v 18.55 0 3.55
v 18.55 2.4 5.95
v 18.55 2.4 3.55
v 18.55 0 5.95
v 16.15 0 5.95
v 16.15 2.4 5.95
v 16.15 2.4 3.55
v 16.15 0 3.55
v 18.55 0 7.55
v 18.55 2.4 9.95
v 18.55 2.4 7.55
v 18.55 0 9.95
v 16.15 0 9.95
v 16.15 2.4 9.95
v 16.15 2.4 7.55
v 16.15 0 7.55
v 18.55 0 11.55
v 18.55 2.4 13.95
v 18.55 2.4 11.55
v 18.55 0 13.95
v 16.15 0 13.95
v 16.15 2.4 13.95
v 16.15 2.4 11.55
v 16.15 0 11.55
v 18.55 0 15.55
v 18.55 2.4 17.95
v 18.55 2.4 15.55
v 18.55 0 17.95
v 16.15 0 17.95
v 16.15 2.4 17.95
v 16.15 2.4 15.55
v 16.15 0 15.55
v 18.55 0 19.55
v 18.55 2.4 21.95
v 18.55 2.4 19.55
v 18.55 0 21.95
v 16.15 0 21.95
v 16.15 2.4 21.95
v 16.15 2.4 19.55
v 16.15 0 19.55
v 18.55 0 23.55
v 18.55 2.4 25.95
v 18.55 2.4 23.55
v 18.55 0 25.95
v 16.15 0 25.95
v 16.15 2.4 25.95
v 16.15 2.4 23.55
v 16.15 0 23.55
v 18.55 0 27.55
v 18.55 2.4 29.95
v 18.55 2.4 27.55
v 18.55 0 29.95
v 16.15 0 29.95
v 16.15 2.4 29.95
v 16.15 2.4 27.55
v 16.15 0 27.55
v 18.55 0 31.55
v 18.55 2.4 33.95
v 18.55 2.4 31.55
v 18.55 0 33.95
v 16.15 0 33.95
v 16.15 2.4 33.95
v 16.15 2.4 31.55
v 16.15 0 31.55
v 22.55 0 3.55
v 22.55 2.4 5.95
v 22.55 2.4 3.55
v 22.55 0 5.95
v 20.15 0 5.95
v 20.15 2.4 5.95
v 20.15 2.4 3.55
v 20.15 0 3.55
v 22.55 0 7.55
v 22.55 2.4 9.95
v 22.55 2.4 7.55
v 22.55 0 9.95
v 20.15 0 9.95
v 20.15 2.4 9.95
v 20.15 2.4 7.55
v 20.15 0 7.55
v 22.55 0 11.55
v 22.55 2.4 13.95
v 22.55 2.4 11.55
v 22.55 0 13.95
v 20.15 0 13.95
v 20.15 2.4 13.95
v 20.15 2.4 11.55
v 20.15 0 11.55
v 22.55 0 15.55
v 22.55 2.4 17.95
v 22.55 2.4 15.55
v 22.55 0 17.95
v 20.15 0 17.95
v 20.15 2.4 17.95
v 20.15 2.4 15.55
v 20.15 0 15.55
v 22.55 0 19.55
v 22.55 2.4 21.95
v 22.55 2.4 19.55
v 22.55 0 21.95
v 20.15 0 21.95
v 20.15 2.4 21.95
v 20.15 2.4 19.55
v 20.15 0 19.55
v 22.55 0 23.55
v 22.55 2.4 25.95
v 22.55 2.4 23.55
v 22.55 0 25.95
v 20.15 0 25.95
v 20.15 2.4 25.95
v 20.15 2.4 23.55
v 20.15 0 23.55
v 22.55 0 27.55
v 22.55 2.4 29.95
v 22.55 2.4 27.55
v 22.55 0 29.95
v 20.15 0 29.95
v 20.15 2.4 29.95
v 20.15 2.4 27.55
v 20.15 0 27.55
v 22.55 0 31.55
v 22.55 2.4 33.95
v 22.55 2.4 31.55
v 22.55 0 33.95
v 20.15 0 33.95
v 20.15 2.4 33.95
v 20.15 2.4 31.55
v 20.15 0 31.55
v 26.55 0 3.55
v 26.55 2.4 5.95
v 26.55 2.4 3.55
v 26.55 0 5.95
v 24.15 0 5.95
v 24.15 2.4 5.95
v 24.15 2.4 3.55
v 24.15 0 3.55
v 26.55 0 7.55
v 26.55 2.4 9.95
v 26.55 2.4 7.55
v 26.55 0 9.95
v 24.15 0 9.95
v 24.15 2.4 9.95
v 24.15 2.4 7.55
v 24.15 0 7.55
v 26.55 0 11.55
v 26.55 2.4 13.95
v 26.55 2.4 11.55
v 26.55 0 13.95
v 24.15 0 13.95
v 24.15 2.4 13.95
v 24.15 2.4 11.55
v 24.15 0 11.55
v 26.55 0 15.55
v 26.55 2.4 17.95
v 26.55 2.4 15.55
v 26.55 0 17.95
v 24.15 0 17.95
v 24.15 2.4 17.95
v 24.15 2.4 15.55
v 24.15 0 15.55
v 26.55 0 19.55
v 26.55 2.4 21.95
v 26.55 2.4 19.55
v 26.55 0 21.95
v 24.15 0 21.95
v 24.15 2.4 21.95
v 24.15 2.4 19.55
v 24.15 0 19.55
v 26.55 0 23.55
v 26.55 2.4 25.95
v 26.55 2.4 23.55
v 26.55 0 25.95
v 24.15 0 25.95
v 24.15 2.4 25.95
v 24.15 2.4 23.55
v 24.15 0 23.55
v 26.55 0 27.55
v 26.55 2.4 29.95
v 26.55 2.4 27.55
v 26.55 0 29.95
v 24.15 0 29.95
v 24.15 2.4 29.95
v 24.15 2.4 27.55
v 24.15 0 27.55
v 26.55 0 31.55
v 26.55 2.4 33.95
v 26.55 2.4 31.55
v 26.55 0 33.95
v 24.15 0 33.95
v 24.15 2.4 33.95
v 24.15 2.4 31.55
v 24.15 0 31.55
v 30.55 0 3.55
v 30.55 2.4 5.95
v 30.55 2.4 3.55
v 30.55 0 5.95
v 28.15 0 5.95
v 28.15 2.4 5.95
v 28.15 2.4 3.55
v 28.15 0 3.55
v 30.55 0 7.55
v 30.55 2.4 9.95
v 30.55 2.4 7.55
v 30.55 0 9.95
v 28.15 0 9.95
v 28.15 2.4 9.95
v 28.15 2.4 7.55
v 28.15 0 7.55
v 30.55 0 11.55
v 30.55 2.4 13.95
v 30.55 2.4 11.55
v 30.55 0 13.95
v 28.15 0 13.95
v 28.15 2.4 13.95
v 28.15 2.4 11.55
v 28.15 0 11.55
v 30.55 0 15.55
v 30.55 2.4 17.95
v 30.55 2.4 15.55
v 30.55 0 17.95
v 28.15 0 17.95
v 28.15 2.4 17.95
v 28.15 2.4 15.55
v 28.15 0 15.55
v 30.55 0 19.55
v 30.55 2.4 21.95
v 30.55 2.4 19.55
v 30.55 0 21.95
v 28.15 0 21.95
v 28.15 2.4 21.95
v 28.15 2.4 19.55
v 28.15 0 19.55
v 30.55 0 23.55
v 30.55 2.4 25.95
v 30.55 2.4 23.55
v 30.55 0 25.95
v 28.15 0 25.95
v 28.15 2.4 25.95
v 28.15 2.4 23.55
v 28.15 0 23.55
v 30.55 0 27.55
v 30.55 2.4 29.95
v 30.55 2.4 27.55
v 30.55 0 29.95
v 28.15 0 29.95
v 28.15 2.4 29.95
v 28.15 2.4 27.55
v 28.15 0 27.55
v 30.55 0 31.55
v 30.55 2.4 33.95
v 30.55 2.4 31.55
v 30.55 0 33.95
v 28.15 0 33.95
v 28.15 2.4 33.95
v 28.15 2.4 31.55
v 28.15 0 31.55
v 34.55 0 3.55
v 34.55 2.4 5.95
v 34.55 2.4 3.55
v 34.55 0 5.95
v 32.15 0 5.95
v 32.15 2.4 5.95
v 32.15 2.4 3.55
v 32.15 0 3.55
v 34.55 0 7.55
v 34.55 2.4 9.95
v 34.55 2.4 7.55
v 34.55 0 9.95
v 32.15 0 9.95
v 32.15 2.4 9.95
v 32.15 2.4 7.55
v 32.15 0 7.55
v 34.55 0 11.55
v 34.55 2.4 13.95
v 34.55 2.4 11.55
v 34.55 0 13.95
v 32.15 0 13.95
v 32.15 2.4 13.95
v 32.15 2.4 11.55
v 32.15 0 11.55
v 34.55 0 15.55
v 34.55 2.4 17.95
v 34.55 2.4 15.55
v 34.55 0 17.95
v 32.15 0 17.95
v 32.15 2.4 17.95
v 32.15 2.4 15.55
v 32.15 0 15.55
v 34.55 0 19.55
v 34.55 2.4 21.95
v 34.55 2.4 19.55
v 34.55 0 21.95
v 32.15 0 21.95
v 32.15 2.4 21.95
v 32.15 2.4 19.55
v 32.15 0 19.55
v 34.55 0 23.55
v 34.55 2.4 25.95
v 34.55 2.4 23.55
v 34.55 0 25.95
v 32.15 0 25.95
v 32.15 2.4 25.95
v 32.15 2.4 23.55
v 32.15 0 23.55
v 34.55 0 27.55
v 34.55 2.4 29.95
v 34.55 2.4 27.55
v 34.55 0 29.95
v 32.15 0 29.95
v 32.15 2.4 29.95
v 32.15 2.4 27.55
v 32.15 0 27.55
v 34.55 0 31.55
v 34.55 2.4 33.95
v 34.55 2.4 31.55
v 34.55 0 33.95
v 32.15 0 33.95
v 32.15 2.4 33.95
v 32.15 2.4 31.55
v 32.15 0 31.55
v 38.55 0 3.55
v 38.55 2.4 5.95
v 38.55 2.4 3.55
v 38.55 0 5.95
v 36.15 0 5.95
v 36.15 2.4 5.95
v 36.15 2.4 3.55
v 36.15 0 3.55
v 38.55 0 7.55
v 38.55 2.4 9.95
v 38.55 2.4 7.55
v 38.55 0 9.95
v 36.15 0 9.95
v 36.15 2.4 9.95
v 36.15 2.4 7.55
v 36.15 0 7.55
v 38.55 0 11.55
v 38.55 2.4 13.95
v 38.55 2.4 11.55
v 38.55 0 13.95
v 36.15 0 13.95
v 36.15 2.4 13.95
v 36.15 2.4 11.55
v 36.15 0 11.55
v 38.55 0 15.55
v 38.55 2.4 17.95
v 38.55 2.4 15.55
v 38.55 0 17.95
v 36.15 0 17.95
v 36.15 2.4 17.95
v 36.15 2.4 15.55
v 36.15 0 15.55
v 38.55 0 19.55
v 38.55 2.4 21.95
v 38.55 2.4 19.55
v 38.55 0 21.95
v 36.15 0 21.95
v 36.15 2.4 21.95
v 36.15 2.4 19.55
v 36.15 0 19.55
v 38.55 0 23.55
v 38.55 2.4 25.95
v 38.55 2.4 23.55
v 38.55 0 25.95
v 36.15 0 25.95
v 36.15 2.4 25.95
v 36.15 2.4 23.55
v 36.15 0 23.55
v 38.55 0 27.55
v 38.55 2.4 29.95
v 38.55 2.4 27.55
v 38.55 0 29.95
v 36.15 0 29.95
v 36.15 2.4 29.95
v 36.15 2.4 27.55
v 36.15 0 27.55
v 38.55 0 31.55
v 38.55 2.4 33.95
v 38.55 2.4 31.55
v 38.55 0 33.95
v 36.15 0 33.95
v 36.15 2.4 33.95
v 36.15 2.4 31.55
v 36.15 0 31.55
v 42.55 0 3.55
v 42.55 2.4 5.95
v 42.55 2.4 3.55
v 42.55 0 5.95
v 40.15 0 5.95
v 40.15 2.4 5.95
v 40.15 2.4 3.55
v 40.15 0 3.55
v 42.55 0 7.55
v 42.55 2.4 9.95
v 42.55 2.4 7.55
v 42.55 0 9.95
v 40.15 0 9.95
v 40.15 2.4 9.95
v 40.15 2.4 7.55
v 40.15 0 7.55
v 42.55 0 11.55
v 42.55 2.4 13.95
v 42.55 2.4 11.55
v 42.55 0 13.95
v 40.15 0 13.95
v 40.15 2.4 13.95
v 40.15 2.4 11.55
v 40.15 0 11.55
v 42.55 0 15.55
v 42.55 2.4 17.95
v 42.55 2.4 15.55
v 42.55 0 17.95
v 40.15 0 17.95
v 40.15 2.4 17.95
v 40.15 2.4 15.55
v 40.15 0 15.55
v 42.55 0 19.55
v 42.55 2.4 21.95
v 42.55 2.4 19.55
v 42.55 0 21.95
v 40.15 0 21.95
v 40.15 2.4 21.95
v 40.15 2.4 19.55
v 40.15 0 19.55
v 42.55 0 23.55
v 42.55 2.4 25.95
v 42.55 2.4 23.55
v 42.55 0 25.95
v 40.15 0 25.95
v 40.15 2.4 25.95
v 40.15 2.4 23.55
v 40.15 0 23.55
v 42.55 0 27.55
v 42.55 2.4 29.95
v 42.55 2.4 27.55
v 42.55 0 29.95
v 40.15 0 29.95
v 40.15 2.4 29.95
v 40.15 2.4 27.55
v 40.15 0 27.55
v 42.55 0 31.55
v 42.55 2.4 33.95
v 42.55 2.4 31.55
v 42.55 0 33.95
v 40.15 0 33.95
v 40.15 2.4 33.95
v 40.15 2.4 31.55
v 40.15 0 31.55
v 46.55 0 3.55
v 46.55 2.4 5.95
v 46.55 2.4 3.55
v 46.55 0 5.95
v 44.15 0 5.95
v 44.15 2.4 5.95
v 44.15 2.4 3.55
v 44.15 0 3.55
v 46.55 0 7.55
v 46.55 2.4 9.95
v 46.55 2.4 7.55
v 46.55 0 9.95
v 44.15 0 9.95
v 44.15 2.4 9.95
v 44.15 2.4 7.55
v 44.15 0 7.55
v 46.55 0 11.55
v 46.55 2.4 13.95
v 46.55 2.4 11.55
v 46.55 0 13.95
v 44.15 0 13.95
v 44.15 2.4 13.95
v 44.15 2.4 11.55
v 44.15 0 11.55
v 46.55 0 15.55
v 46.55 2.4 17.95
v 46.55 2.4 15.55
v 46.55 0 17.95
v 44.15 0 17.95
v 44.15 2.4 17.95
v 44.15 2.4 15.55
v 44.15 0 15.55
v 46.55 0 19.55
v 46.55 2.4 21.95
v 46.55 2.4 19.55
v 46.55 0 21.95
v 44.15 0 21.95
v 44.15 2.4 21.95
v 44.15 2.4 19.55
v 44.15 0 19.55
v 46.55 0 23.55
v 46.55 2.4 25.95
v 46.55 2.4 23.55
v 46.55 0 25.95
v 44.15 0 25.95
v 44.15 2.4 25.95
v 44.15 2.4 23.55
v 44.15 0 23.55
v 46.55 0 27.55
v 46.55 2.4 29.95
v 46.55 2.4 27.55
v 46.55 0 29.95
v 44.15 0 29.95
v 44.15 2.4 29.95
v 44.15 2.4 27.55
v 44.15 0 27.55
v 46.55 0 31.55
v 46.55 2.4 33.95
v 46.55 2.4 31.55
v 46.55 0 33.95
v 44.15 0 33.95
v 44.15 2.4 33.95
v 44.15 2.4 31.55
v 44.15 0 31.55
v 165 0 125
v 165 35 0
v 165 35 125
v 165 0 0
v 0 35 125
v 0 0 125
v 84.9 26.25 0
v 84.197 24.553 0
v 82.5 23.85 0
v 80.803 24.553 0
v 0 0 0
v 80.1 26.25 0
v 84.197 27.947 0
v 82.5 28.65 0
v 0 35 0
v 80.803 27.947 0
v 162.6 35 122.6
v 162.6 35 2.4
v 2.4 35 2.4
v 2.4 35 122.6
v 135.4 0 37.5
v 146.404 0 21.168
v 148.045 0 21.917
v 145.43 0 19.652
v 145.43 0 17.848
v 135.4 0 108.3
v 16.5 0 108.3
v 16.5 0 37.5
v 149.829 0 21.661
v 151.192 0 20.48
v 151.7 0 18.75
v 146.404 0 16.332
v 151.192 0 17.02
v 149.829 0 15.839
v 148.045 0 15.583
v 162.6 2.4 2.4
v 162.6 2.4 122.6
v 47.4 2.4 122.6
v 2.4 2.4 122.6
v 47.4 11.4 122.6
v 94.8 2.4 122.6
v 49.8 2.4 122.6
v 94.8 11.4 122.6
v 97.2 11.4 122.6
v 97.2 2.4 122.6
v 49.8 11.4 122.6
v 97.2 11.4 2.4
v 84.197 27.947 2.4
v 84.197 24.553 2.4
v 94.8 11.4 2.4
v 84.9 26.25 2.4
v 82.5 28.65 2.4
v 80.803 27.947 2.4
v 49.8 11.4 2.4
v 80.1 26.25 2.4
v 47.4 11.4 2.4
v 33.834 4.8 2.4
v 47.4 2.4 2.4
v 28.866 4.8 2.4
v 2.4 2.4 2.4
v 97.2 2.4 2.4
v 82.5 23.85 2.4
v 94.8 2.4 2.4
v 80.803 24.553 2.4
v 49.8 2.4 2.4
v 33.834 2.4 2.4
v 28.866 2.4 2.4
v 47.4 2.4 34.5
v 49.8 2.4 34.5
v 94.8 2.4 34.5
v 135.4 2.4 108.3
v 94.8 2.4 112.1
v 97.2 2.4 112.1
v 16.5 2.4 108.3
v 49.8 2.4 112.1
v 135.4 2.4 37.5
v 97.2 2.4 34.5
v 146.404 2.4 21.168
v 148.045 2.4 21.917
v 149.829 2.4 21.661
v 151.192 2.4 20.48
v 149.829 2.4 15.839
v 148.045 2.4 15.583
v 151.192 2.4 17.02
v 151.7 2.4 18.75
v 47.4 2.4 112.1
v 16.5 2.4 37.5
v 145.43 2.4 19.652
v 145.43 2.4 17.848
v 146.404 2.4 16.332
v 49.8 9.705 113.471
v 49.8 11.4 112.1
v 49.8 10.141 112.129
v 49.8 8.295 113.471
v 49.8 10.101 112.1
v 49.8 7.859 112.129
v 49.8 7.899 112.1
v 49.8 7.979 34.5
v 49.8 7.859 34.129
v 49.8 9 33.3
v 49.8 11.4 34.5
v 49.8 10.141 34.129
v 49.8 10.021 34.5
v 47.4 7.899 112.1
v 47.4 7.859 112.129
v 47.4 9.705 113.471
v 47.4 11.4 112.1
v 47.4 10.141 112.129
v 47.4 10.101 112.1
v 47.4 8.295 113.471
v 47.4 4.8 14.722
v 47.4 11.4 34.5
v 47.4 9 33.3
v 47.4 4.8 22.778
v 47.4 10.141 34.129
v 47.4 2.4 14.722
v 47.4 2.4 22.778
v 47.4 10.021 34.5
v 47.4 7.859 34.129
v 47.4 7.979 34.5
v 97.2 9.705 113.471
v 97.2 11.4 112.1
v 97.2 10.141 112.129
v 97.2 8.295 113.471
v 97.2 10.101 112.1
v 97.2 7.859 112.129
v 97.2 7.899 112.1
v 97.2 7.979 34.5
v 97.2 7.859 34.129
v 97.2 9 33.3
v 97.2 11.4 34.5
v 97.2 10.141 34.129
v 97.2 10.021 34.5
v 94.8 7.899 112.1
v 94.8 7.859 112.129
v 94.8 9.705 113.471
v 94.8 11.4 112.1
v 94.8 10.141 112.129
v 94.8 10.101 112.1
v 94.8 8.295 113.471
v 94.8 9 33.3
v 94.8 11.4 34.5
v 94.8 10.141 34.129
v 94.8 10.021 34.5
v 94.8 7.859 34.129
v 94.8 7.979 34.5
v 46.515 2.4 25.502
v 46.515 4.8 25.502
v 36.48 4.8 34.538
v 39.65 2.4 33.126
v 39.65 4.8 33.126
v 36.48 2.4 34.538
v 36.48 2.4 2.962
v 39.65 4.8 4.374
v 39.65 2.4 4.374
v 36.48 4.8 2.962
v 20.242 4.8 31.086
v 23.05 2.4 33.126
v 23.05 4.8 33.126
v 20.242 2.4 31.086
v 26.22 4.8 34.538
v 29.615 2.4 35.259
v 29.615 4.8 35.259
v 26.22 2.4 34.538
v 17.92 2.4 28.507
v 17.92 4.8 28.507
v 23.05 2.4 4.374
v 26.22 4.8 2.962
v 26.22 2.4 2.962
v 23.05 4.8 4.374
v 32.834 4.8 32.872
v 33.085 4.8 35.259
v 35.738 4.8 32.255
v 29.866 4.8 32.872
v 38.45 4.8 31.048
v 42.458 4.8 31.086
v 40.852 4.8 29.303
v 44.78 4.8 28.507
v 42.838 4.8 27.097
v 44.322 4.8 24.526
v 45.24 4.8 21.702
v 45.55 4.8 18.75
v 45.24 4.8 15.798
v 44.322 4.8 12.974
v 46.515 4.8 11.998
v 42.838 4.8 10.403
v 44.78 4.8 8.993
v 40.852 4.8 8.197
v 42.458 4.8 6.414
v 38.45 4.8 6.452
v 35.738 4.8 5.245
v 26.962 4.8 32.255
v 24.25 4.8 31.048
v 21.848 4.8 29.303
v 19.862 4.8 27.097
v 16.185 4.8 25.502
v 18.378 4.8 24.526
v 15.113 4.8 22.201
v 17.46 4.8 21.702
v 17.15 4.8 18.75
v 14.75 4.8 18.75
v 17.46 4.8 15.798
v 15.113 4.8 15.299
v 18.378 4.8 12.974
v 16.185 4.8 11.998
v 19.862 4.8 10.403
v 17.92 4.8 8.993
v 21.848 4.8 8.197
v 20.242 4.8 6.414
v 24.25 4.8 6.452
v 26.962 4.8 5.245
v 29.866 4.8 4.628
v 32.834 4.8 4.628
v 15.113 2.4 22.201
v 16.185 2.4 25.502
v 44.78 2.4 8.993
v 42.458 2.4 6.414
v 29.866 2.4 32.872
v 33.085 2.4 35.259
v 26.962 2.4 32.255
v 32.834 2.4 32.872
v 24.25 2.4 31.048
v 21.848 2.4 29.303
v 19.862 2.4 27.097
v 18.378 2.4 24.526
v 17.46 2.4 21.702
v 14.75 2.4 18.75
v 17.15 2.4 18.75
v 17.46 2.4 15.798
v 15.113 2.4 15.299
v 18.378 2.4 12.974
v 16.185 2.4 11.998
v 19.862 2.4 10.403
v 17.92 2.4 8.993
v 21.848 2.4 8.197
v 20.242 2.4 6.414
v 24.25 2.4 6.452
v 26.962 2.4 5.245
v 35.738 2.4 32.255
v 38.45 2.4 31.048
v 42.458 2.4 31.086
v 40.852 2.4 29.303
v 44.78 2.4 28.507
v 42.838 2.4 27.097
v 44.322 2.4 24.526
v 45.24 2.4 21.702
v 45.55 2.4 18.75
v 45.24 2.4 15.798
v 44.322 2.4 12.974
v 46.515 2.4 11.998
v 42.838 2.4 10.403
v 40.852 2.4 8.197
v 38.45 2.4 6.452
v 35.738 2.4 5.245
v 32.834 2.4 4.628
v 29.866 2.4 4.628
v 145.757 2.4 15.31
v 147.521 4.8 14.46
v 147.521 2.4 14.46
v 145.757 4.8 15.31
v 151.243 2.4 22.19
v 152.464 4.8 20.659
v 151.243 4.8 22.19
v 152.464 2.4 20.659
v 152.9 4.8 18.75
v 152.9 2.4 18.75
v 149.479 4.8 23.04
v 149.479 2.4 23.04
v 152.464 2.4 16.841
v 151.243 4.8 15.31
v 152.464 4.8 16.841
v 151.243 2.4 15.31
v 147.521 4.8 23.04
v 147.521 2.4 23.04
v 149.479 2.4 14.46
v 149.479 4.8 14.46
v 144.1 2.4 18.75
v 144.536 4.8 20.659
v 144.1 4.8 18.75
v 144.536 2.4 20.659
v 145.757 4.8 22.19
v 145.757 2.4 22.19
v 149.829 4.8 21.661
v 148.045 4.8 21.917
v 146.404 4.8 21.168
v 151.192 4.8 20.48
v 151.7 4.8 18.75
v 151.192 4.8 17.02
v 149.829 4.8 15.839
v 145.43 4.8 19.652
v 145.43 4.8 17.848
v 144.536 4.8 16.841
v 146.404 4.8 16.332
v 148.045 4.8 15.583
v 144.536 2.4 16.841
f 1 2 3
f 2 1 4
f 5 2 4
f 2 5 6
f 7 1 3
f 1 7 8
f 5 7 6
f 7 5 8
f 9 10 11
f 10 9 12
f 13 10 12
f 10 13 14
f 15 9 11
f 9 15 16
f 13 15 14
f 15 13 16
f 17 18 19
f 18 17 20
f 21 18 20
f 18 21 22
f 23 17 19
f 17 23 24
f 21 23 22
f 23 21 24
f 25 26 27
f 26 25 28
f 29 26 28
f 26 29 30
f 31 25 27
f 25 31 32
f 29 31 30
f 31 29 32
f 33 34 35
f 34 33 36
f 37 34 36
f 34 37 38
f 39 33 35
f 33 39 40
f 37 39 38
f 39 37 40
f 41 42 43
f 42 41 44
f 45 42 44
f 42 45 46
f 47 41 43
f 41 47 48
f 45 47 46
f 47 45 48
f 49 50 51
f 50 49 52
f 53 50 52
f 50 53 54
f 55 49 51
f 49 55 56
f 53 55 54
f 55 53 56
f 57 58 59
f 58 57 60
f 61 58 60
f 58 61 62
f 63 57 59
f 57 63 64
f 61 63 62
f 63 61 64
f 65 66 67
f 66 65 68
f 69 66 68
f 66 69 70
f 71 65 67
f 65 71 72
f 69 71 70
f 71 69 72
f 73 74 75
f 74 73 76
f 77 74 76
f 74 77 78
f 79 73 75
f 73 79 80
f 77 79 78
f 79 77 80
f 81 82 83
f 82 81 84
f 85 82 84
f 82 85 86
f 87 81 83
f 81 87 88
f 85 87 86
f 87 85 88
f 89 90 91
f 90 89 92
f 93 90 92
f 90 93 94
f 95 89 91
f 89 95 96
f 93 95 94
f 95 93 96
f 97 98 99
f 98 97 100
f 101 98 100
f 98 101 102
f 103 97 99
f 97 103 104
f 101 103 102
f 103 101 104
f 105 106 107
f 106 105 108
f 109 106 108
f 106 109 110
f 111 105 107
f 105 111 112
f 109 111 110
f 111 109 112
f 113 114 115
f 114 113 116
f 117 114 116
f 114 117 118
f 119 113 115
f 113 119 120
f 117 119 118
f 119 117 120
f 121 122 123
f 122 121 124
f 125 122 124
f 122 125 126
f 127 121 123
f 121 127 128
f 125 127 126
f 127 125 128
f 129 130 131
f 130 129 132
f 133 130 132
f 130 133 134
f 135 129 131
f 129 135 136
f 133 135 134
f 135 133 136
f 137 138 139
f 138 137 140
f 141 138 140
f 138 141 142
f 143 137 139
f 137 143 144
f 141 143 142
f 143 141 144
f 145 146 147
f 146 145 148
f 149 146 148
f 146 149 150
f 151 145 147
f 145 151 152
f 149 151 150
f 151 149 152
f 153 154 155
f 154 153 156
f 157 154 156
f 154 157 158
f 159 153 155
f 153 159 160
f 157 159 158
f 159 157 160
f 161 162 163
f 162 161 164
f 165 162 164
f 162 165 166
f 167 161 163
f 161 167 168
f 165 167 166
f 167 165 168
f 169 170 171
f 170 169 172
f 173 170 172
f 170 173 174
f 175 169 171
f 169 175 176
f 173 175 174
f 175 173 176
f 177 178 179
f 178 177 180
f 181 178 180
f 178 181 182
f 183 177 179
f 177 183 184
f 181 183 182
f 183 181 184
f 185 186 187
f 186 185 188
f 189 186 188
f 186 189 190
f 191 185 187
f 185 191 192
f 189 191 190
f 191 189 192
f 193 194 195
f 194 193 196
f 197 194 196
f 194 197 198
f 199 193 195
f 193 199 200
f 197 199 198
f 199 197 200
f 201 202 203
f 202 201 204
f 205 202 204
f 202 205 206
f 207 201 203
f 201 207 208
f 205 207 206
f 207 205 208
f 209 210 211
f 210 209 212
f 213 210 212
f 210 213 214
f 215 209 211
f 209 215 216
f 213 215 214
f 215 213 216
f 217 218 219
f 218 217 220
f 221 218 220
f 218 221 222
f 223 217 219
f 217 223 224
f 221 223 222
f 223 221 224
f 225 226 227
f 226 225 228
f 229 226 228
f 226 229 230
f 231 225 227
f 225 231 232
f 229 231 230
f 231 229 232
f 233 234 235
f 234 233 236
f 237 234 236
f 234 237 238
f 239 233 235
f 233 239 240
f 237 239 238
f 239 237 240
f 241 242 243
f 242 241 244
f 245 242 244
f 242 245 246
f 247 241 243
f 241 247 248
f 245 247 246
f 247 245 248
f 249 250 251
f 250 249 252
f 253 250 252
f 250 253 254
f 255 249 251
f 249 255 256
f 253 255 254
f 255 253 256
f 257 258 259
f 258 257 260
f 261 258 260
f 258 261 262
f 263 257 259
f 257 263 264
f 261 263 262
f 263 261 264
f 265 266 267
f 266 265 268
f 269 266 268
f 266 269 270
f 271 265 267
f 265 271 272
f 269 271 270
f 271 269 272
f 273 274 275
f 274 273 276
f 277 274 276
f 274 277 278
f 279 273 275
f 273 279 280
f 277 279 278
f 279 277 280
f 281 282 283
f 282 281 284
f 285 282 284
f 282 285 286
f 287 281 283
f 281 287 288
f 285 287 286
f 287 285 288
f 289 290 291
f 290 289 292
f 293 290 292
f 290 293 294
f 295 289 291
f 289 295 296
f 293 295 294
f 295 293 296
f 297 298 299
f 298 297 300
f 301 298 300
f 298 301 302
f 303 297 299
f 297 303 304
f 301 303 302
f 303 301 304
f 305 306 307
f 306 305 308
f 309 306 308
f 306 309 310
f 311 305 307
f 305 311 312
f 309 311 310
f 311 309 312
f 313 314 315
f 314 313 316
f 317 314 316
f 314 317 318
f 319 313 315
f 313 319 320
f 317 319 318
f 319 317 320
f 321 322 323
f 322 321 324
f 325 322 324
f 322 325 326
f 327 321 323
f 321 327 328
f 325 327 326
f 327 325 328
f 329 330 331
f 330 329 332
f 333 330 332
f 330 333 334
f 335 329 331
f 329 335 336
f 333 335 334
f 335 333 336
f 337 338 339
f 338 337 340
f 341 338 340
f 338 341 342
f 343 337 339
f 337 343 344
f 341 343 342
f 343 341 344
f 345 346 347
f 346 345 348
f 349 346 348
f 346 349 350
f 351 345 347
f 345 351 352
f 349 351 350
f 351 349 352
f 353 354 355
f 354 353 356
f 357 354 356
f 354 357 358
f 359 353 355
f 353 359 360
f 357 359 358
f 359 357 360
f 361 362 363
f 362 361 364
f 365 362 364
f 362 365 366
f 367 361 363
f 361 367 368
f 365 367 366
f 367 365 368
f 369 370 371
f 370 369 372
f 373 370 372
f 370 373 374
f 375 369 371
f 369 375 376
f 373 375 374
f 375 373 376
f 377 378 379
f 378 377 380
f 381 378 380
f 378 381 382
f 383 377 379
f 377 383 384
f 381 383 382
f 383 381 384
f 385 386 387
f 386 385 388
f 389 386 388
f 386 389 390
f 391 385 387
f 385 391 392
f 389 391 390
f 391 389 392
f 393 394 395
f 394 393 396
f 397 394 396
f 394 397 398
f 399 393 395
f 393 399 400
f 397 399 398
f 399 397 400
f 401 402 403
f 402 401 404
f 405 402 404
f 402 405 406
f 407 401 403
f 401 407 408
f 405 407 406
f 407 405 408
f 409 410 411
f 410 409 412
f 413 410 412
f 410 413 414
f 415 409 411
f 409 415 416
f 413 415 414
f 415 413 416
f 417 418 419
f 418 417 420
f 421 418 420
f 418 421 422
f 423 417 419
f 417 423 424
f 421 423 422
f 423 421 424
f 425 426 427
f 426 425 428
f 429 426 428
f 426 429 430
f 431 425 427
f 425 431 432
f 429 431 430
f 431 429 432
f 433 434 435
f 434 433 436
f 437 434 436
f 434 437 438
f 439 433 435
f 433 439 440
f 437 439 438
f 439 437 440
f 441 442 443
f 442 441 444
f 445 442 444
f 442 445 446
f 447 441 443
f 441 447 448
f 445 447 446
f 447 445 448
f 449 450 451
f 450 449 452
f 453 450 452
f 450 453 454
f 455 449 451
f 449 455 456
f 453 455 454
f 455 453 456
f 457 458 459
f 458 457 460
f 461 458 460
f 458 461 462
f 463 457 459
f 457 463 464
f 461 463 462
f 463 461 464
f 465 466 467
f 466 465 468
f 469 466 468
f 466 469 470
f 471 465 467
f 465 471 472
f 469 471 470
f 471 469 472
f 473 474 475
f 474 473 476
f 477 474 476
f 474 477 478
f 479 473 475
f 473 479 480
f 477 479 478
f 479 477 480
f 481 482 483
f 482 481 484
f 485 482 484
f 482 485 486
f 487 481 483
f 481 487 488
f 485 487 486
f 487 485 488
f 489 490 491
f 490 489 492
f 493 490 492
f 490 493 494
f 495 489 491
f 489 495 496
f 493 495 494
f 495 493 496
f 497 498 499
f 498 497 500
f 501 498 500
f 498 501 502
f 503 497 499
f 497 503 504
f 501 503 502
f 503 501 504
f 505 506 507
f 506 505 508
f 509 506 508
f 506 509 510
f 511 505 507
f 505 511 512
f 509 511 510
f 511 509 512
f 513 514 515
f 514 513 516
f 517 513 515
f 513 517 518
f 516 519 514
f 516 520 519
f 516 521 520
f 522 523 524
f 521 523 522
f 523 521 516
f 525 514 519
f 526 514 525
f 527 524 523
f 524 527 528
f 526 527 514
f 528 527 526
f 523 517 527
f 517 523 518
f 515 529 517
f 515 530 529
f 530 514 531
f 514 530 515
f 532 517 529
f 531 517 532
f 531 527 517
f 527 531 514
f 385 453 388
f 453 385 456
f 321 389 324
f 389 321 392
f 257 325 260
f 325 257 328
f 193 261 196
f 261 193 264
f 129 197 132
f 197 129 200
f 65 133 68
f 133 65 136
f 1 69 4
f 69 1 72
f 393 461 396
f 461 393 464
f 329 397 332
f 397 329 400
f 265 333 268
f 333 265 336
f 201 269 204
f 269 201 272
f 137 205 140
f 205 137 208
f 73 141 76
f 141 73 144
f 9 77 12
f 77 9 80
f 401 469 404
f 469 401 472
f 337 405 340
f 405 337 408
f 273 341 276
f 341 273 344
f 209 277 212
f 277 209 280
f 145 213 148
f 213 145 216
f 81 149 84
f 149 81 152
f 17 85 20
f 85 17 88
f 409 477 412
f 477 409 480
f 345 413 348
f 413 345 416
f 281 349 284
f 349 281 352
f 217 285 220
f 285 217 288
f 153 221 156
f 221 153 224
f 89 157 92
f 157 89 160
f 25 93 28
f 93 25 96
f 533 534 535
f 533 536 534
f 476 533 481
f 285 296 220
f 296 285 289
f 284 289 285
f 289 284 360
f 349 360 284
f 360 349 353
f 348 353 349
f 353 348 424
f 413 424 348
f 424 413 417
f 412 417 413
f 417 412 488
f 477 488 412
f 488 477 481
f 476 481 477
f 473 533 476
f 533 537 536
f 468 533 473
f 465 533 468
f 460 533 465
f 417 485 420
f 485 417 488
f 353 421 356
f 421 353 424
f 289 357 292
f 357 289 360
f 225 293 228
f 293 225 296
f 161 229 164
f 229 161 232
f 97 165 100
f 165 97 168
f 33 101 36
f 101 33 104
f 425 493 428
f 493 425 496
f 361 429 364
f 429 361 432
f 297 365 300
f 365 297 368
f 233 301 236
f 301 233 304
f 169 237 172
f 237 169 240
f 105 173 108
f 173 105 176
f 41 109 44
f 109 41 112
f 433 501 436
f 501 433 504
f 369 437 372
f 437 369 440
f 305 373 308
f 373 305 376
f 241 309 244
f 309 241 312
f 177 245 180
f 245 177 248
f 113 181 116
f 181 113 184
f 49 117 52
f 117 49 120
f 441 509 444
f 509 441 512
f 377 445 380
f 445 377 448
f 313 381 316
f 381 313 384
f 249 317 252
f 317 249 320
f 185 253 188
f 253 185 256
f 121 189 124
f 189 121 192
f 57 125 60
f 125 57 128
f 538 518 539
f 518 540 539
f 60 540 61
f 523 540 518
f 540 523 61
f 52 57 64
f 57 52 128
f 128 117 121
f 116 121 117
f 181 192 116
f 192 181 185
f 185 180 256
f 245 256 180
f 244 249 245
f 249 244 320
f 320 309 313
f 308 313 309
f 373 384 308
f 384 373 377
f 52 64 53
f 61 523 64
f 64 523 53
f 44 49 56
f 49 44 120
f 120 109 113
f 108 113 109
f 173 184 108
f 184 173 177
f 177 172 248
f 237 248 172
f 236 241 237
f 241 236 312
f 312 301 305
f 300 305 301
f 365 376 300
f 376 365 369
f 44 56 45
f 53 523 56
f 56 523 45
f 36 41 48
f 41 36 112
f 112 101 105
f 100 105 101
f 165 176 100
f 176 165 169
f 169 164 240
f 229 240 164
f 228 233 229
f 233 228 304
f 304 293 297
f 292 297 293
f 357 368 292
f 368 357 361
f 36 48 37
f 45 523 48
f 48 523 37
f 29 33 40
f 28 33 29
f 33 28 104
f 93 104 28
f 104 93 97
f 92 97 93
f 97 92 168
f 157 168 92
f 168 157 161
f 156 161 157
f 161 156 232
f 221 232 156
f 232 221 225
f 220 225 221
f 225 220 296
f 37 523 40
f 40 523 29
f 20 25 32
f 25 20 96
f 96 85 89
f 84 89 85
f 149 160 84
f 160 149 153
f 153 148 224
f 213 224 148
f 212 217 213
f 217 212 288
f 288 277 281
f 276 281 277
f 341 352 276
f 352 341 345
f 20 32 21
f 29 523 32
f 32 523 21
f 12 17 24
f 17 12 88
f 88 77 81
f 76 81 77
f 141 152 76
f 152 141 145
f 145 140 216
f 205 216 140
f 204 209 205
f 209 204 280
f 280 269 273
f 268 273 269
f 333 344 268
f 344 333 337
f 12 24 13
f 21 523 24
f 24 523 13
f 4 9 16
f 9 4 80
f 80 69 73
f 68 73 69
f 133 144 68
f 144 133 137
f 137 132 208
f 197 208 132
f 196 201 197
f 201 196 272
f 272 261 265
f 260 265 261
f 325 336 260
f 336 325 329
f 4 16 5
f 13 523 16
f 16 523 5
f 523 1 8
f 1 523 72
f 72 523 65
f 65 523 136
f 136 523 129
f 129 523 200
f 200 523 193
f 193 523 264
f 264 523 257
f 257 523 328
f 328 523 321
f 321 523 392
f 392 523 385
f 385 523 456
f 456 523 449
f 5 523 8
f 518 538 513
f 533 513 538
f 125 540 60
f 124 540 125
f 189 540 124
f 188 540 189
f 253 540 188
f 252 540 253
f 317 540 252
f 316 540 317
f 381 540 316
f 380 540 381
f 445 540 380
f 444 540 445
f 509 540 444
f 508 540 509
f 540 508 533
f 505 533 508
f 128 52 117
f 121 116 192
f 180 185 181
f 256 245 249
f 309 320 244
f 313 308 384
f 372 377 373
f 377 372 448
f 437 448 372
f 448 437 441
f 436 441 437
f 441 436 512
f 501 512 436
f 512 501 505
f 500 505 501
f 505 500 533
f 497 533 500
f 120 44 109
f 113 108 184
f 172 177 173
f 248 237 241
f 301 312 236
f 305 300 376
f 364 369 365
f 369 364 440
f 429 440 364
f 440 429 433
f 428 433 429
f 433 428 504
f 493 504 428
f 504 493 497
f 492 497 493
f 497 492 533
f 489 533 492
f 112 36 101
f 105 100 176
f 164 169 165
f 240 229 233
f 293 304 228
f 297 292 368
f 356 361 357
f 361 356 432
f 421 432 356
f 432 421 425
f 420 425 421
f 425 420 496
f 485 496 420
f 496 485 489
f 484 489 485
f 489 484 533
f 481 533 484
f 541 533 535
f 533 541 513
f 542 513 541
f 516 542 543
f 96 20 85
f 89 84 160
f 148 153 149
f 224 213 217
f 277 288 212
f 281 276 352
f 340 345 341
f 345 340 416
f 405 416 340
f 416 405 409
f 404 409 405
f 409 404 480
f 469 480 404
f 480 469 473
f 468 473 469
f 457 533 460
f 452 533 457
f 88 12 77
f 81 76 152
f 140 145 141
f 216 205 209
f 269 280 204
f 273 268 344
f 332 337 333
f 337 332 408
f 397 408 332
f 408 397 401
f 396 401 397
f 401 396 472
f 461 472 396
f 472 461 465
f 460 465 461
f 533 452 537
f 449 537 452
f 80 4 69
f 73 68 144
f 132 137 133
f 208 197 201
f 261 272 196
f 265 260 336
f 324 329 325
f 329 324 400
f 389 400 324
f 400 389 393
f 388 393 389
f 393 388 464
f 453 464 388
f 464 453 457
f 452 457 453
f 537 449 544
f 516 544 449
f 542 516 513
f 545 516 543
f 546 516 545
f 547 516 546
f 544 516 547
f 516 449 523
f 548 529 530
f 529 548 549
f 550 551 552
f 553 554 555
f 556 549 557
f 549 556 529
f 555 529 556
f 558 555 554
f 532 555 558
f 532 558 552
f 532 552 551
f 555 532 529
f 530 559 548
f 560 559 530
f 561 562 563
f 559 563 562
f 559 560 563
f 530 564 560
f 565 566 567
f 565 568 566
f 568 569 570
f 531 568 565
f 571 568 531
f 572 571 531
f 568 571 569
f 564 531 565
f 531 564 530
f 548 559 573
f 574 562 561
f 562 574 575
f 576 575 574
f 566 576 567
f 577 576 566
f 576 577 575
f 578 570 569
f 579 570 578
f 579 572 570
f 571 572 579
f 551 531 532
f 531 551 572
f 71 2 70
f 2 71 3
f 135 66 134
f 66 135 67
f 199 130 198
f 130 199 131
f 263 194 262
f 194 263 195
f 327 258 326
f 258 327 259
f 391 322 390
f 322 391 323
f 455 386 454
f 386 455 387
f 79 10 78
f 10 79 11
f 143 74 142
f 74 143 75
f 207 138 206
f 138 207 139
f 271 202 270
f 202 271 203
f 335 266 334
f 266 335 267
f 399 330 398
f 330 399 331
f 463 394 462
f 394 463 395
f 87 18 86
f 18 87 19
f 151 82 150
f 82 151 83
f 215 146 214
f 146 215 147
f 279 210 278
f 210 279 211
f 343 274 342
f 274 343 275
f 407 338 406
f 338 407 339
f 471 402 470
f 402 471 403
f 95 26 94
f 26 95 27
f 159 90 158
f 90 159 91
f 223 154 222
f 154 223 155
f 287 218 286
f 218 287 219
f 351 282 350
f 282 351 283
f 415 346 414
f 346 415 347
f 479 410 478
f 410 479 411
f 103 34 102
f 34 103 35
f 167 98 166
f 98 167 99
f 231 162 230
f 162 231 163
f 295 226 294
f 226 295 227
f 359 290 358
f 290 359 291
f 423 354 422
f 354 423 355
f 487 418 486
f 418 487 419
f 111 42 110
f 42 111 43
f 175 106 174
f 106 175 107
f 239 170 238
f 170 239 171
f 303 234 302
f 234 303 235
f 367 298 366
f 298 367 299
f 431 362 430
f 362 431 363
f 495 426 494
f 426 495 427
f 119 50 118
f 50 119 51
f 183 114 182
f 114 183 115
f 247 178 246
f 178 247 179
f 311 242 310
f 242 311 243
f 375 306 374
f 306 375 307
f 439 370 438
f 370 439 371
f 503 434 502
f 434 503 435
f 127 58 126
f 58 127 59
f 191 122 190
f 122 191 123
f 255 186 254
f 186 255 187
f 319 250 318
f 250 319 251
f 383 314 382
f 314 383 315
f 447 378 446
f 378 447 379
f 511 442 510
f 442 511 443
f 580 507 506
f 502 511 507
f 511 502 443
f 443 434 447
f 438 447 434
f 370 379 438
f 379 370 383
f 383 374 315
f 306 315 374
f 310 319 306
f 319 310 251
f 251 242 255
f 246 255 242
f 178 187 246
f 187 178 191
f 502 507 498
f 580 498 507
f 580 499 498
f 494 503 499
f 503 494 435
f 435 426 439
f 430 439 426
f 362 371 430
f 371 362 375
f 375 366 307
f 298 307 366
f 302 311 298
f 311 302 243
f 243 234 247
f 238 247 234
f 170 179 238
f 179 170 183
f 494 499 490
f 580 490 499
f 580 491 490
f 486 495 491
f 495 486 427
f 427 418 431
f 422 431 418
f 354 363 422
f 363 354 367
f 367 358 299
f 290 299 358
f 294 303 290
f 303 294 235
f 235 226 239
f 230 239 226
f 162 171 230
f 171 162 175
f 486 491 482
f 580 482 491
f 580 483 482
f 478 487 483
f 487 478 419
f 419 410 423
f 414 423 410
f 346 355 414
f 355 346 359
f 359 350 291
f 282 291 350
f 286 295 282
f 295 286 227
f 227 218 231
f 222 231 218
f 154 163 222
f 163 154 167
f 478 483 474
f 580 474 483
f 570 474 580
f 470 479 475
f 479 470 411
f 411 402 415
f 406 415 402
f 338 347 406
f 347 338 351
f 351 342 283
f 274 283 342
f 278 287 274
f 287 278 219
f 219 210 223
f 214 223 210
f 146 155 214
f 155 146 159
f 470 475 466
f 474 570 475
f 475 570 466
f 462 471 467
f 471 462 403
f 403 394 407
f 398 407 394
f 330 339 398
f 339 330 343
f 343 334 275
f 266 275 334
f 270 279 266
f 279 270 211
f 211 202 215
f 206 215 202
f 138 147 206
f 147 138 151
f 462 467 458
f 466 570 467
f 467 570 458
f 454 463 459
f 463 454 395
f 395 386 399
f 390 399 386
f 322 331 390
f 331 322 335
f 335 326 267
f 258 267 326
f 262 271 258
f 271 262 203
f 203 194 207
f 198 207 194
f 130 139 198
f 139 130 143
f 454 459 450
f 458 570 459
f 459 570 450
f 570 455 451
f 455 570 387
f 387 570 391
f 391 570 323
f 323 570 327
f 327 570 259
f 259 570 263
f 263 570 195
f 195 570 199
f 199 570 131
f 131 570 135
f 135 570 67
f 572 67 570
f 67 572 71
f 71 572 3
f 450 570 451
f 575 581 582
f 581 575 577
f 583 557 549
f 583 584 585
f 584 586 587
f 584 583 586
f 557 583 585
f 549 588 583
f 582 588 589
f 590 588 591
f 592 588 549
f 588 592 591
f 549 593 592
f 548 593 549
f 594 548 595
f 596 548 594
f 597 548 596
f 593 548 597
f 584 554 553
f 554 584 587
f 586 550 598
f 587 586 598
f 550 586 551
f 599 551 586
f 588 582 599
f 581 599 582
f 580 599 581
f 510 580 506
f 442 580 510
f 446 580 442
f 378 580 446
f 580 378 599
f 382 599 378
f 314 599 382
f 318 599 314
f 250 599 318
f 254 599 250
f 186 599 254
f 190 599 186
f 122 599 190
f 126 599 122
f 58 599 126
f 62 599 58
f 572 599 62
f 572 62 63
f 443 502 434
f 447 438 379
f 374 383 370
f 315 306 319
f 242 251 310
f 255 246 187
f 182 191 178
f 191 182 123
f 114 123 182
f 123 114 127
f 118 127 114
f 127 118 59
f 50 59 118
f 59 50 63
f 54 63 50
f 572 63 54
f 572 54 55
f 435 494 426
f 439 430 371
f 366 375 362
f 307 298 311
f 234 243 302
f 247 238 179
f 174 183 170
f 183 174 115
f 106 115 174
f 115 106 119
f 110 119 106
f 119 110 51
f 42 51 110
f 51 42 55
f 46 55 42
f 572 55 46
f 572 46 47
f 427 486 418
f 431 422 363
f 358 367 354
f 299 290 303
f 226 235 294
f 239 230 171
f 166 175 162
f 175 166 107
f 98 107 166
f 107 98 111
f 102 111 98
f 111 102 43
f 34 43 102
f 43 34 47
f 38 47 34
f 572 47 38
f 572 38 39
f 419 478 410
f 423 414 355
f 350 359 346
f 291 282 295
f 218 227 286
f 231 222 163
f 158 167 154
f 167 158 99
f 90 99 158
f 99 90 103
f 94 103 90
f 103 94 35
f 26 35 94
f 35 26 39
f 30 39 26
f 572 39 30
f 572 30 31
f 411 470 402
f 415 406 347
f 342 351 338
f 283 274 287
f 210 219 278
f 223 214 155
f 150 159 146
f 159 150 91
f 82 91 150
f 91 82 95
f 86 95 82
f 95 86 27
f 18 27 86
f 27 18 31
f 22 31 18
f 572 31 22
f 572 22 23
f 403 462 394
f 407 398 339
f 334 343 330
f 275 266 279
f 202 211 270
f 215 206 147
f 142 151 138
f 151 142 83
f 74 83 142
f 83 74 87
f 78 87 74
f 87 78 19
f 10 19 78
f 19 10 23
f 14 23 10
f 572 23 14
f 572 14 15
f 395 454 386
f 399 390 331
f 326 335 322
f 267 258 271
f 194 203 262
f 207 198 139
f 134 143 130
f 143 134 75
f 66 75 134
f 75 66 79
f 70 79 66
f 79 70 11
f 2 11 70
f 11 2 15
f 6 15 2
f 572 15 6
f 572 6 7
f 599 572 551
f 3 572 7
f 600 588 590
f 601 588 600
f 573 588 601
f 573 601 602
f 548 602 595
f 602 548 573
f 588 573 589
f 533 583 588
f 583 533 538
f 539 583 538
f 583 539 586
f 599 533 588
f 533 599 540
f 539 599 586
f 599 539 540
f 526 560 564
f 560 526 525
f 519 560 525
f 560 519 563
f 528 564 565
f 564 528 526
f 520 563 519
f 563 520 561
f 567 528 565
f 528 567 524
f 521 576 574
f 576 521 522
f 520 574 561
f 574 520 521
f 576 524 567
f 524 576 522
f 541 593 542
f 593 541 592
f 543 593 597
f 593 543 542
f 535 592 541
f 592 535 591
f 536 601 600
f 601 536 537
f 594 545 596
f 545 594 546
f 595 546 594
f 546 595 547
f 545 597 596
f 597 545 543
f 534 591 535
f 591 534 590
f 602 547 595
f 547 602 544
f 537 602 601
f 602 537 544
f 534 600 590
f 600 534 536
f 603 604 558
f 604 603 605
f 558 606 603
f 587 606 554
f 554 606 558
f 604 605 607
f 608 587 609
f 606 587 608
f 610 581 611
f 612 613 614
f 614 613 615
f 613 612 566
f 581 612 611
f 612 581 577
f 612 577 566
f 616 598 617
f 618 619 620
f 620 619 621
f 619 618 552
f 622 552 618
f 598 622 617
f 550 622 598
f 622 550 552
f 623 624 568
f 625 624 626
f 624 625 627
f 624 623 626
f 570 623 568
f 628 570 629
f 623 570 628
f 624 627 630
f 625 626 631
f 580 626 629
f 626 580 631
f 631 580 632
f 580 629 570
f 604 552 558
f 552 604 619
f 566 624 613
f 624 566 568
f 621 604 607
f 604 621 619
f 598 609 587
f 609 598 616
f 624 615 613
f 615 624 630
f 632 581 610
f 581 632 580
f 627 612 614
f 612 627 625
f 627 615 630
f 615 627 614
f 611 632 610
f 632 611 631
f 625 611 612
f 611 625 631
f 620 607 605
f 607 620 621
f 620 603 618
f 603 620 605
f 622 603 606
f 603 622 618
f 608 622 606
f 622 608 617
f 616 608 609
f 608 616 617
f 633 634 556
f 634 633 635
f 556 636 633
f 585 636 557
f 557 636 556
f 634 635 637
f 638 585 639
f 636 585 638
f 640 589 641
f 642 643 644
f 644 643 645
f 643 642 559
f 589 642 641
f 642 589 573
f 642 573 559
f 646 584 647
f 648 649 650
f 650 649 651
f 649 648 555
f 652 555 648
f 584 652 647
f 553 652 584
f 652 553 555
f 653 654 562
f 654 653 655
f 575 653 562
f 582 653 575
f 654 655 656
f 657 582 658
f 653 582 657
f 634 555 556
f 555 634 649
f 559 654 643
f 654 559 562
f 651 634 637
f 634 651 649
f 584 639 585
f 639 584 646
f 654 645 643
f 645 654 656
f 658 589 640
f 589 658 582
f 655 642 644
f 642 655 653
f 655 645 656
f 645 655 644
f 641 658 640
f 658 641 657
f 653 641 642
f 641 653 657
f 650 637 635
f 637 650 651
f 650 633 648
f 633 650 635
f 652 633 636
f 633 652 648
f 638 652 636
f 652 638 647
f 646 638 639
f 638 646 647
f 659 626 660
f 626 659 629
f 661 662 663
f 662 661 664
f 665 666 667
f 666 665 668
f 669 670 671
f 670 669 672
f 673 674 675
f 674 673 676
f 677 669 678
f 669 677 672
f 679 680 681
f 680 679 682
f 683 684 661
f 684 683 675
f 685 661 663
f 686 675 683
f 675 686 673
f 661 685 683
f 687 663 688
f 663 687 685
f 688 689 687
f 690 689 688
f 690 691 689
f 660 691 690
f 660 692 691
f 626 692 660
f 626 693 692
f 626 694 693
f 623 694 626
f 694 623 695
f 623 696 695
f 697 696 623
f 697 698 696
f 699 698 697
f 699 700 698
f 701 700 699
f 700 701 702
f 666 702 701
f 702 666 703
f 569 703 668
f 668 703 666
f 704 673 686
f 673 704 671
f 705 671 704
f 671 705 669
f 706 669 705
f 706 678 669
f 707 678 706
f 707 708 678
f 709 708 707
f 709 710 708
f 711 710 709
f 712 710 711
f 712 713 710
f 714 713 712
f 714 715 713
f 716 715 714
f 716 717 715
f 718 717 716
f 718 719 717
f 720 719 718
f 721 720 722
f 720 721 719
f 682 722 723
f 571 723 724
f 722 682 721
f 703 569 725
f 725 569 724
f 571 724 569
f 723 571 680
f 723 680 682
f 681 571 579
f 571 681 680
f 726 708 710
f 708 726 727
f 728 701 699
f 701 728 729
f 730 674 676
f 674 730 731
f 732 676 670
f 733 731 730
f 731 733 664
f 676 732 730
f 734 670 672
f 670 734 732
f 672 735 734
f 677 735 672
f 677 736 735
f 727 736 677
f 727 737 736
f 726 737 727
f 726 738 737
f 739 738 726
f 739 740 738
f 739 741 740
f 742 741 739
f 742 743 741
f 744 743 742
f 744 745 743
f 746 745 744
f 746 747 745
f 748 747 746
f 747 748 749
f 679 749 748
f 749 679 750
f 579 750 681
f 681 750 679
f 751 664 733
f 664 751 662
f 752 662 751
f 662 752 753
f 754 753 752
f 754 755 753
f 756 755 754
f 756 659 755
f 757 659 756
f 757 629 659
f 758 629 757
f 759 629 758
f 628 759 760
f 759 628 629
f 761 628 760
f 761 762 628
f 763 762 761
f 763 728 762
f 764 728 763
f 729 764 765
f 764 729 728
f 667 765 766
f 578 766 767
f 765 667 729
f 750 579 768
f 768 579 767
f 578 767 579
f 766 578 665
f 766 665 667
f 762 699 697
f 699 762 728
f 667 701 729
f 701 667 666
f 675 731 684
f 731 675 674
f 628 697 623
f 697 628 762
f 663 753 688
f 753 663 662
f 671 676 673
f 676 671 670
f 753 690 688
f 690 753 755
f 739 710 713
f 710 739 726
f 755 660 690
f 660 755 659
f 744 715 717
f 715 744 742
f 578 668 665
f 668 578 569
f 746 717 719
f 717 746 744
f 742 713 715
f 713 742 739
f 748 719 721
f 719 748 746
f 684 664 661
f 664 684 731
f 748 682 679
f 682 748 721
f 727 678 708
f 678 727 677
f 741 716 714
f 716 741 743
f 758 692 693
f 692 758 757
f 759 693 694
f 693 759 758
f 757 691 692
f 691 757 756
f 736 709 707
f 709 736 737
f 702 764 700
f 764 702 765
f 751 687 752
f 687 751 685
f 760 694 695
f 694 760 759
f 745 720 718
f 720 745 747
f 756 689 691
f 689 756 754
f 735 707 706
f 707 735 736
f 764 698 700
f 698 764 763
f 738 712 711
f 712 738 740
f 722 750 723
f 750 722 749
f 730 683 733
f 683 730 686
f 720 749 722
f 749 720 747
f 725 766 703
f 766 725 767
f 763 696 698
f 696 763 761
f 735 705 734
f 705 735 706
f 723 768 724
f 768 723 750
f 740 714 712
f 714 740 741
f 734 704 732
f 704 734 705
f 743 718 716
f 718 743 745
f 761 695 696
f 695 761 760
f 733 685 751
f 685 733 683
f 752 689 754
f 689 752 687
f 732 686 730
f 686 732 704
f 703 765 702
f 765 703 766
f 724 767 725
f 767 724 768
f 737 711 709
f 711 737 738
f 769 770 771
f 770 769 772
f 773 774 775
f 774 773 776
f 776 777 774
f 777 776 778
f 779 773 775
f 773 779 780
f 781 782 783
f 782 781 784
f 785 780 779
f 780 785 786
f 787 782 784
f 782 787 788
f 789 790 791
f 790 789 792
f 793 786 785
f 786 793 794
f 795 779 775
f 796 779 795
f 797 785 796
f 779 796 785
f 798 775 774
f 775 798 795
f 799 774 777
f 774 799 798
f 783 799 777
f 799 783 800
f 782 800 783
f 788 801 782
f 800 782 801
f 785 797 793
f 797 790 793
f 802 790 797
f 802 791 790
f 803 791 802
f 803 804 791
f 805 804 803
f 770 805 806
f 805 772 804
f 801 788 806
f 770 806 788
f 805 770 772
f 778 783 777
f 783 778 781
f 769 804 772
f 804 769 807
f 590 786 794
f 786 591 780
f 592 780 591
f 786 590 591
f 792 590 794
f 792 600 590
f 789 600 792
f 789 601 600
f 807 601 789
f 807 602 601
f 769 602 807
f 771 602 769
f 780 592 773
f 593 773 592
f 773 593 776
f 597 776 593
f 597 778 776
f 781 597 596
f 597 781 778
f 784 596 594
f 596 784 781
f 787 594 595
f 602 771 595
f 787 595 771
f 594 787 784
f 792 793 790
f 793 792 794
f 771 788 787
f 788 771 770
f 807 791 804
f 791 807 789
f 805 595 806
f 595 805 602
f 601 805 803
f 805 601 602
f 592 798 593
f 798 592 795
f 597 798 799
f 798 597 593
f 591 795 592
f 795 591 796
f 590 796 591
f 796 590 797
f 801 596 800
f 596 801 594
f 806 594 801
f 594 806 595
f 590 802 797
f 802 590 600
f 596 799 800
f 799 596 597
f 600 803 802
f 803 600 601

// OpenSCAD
// file: variables.scad
// Size are in millimeters
margin = 0.4;

height = 135;   // z axis
width = 94;     // x axis
depth = 38;      // y axis
thickness = 2.4;
cam_diameter = 15;
button_diameter = 24.2;
speaker_diameter = 28 + margin;
micro_diameter = 6 + margin;
name = "DOORBELL";

// Only for client
client_height = 125;   // z axis
client_width = 165;     // x axis
client_depth = 35;      // y axis
screen_width = 118.5;
screen_height = 70.4;   // Diff 5.5mm from pcb top to screen top
screen_pcb_height = 78;
screen_pcb_depth = 9;
// main file
include <variables.scad>;

speaker_pos_x = 0.19 * client_width;
speaker_pos_z = 0.15 * client_height;
micro_pos_x = 0.90 * client_width;
micro_pos_z = 0.15 * client_height;

// Front
color ("blue")
difference () {
    // Box
    cube([client_width, client_depth, client_height]);
    
    // Empty box
    translate ([thickness, thickness, thickness])
        cube ([client_width-2*thickness, client_depth, client_height-2*thickness]);
    
    // Screen hole
    translate ([0.1 * client_width, 0-margin, 0.3 * client_height])
        cube ([screen_width + margin, thickness+2*margin, screen_height + margin]);
    
    // Screw hole
    translate ([0.5 * client_width, 0.75 * client_depth, -margin])
        cylinder (h = 2*thickness, r = thickness);
    
    // Speaker grid
    grid_hole_size = 2.4;
    grid_step = 4;
    translate ([speaker_pos_x - 1, -0.5*thickness, speaker_pos_z - 1])
        for (x = [-speaker_diameter/2 : grid_step : speaker_diameter/2]) {
            for (z = [-speaker_diameter/2 : grid_step : speaker_diameter/2]) {
                translate ([x, 0, z])
                cube ([grid_hole_size, 2*thickness, grid_hole_size]);
            }
        };
    // Micro hole
    translate ([micro_pos_x, thickness + margin, micro_pos_z])
        rotate ([90,0,0])
        cylinder (h = thickness + 2*margin, r = (micro_diameter)/2);
};

// Supports for screen
module support () { 
    difference () {
        cube([thickness, screen_pcb_depth + thickness, client_height]);
        translate ([-0.5*margin, -0.5*margin, 0.3 * client_height - 3]) cube([thickness + margin, screen_pcb_depth + thickness + margin, screen_pcb_height - margin]);
        translate ([-0.5*margin, screen_pcb_depth, 0.3 * client_height - 3]) rotate ([0,90,0]) cylinder (h = thickness + 2*margin, r = (thickness)/2);
        translate ([-0.5*margin, screen_pcb_depth, (0.3 * client_height - 3) + screen_pcb_height]) rotate ([0,90,0]) cylinder (h = thickness + 2*margin, r = (thickness)/2);
    }
};
color ("blue") translate ([0.4 * screen_width, 0, 0]) support();
color ("blue") translate ([0.8 * screen_width, 0, 0]) support();

// Support for speaker
color ("blue")
translate ([speaker_pos_x, 2*thickness, speaker_pos_z])
rotate ([90,0,0])
difference () {
    cylinder (h = thickness, r = (speaker_diameter+2*thickness)/2);
    translate ([0, 0, -margin]) cylinder (h = thickness+2*margin, r = (speaker_diameter)/2);
};

// Support for microphone
color ("blue")
translate ([micro_pos_x, 2*thickness, micro_pos_z])
rotate ([90,0,0])
difference () {
    cylinder (h = thickness, r = (micro_diameter+thickness)/2);
    translate ([0, 0, -margin]) cylinder (h = thickness+2*margin, r = (micro_diameter)/2);
}
